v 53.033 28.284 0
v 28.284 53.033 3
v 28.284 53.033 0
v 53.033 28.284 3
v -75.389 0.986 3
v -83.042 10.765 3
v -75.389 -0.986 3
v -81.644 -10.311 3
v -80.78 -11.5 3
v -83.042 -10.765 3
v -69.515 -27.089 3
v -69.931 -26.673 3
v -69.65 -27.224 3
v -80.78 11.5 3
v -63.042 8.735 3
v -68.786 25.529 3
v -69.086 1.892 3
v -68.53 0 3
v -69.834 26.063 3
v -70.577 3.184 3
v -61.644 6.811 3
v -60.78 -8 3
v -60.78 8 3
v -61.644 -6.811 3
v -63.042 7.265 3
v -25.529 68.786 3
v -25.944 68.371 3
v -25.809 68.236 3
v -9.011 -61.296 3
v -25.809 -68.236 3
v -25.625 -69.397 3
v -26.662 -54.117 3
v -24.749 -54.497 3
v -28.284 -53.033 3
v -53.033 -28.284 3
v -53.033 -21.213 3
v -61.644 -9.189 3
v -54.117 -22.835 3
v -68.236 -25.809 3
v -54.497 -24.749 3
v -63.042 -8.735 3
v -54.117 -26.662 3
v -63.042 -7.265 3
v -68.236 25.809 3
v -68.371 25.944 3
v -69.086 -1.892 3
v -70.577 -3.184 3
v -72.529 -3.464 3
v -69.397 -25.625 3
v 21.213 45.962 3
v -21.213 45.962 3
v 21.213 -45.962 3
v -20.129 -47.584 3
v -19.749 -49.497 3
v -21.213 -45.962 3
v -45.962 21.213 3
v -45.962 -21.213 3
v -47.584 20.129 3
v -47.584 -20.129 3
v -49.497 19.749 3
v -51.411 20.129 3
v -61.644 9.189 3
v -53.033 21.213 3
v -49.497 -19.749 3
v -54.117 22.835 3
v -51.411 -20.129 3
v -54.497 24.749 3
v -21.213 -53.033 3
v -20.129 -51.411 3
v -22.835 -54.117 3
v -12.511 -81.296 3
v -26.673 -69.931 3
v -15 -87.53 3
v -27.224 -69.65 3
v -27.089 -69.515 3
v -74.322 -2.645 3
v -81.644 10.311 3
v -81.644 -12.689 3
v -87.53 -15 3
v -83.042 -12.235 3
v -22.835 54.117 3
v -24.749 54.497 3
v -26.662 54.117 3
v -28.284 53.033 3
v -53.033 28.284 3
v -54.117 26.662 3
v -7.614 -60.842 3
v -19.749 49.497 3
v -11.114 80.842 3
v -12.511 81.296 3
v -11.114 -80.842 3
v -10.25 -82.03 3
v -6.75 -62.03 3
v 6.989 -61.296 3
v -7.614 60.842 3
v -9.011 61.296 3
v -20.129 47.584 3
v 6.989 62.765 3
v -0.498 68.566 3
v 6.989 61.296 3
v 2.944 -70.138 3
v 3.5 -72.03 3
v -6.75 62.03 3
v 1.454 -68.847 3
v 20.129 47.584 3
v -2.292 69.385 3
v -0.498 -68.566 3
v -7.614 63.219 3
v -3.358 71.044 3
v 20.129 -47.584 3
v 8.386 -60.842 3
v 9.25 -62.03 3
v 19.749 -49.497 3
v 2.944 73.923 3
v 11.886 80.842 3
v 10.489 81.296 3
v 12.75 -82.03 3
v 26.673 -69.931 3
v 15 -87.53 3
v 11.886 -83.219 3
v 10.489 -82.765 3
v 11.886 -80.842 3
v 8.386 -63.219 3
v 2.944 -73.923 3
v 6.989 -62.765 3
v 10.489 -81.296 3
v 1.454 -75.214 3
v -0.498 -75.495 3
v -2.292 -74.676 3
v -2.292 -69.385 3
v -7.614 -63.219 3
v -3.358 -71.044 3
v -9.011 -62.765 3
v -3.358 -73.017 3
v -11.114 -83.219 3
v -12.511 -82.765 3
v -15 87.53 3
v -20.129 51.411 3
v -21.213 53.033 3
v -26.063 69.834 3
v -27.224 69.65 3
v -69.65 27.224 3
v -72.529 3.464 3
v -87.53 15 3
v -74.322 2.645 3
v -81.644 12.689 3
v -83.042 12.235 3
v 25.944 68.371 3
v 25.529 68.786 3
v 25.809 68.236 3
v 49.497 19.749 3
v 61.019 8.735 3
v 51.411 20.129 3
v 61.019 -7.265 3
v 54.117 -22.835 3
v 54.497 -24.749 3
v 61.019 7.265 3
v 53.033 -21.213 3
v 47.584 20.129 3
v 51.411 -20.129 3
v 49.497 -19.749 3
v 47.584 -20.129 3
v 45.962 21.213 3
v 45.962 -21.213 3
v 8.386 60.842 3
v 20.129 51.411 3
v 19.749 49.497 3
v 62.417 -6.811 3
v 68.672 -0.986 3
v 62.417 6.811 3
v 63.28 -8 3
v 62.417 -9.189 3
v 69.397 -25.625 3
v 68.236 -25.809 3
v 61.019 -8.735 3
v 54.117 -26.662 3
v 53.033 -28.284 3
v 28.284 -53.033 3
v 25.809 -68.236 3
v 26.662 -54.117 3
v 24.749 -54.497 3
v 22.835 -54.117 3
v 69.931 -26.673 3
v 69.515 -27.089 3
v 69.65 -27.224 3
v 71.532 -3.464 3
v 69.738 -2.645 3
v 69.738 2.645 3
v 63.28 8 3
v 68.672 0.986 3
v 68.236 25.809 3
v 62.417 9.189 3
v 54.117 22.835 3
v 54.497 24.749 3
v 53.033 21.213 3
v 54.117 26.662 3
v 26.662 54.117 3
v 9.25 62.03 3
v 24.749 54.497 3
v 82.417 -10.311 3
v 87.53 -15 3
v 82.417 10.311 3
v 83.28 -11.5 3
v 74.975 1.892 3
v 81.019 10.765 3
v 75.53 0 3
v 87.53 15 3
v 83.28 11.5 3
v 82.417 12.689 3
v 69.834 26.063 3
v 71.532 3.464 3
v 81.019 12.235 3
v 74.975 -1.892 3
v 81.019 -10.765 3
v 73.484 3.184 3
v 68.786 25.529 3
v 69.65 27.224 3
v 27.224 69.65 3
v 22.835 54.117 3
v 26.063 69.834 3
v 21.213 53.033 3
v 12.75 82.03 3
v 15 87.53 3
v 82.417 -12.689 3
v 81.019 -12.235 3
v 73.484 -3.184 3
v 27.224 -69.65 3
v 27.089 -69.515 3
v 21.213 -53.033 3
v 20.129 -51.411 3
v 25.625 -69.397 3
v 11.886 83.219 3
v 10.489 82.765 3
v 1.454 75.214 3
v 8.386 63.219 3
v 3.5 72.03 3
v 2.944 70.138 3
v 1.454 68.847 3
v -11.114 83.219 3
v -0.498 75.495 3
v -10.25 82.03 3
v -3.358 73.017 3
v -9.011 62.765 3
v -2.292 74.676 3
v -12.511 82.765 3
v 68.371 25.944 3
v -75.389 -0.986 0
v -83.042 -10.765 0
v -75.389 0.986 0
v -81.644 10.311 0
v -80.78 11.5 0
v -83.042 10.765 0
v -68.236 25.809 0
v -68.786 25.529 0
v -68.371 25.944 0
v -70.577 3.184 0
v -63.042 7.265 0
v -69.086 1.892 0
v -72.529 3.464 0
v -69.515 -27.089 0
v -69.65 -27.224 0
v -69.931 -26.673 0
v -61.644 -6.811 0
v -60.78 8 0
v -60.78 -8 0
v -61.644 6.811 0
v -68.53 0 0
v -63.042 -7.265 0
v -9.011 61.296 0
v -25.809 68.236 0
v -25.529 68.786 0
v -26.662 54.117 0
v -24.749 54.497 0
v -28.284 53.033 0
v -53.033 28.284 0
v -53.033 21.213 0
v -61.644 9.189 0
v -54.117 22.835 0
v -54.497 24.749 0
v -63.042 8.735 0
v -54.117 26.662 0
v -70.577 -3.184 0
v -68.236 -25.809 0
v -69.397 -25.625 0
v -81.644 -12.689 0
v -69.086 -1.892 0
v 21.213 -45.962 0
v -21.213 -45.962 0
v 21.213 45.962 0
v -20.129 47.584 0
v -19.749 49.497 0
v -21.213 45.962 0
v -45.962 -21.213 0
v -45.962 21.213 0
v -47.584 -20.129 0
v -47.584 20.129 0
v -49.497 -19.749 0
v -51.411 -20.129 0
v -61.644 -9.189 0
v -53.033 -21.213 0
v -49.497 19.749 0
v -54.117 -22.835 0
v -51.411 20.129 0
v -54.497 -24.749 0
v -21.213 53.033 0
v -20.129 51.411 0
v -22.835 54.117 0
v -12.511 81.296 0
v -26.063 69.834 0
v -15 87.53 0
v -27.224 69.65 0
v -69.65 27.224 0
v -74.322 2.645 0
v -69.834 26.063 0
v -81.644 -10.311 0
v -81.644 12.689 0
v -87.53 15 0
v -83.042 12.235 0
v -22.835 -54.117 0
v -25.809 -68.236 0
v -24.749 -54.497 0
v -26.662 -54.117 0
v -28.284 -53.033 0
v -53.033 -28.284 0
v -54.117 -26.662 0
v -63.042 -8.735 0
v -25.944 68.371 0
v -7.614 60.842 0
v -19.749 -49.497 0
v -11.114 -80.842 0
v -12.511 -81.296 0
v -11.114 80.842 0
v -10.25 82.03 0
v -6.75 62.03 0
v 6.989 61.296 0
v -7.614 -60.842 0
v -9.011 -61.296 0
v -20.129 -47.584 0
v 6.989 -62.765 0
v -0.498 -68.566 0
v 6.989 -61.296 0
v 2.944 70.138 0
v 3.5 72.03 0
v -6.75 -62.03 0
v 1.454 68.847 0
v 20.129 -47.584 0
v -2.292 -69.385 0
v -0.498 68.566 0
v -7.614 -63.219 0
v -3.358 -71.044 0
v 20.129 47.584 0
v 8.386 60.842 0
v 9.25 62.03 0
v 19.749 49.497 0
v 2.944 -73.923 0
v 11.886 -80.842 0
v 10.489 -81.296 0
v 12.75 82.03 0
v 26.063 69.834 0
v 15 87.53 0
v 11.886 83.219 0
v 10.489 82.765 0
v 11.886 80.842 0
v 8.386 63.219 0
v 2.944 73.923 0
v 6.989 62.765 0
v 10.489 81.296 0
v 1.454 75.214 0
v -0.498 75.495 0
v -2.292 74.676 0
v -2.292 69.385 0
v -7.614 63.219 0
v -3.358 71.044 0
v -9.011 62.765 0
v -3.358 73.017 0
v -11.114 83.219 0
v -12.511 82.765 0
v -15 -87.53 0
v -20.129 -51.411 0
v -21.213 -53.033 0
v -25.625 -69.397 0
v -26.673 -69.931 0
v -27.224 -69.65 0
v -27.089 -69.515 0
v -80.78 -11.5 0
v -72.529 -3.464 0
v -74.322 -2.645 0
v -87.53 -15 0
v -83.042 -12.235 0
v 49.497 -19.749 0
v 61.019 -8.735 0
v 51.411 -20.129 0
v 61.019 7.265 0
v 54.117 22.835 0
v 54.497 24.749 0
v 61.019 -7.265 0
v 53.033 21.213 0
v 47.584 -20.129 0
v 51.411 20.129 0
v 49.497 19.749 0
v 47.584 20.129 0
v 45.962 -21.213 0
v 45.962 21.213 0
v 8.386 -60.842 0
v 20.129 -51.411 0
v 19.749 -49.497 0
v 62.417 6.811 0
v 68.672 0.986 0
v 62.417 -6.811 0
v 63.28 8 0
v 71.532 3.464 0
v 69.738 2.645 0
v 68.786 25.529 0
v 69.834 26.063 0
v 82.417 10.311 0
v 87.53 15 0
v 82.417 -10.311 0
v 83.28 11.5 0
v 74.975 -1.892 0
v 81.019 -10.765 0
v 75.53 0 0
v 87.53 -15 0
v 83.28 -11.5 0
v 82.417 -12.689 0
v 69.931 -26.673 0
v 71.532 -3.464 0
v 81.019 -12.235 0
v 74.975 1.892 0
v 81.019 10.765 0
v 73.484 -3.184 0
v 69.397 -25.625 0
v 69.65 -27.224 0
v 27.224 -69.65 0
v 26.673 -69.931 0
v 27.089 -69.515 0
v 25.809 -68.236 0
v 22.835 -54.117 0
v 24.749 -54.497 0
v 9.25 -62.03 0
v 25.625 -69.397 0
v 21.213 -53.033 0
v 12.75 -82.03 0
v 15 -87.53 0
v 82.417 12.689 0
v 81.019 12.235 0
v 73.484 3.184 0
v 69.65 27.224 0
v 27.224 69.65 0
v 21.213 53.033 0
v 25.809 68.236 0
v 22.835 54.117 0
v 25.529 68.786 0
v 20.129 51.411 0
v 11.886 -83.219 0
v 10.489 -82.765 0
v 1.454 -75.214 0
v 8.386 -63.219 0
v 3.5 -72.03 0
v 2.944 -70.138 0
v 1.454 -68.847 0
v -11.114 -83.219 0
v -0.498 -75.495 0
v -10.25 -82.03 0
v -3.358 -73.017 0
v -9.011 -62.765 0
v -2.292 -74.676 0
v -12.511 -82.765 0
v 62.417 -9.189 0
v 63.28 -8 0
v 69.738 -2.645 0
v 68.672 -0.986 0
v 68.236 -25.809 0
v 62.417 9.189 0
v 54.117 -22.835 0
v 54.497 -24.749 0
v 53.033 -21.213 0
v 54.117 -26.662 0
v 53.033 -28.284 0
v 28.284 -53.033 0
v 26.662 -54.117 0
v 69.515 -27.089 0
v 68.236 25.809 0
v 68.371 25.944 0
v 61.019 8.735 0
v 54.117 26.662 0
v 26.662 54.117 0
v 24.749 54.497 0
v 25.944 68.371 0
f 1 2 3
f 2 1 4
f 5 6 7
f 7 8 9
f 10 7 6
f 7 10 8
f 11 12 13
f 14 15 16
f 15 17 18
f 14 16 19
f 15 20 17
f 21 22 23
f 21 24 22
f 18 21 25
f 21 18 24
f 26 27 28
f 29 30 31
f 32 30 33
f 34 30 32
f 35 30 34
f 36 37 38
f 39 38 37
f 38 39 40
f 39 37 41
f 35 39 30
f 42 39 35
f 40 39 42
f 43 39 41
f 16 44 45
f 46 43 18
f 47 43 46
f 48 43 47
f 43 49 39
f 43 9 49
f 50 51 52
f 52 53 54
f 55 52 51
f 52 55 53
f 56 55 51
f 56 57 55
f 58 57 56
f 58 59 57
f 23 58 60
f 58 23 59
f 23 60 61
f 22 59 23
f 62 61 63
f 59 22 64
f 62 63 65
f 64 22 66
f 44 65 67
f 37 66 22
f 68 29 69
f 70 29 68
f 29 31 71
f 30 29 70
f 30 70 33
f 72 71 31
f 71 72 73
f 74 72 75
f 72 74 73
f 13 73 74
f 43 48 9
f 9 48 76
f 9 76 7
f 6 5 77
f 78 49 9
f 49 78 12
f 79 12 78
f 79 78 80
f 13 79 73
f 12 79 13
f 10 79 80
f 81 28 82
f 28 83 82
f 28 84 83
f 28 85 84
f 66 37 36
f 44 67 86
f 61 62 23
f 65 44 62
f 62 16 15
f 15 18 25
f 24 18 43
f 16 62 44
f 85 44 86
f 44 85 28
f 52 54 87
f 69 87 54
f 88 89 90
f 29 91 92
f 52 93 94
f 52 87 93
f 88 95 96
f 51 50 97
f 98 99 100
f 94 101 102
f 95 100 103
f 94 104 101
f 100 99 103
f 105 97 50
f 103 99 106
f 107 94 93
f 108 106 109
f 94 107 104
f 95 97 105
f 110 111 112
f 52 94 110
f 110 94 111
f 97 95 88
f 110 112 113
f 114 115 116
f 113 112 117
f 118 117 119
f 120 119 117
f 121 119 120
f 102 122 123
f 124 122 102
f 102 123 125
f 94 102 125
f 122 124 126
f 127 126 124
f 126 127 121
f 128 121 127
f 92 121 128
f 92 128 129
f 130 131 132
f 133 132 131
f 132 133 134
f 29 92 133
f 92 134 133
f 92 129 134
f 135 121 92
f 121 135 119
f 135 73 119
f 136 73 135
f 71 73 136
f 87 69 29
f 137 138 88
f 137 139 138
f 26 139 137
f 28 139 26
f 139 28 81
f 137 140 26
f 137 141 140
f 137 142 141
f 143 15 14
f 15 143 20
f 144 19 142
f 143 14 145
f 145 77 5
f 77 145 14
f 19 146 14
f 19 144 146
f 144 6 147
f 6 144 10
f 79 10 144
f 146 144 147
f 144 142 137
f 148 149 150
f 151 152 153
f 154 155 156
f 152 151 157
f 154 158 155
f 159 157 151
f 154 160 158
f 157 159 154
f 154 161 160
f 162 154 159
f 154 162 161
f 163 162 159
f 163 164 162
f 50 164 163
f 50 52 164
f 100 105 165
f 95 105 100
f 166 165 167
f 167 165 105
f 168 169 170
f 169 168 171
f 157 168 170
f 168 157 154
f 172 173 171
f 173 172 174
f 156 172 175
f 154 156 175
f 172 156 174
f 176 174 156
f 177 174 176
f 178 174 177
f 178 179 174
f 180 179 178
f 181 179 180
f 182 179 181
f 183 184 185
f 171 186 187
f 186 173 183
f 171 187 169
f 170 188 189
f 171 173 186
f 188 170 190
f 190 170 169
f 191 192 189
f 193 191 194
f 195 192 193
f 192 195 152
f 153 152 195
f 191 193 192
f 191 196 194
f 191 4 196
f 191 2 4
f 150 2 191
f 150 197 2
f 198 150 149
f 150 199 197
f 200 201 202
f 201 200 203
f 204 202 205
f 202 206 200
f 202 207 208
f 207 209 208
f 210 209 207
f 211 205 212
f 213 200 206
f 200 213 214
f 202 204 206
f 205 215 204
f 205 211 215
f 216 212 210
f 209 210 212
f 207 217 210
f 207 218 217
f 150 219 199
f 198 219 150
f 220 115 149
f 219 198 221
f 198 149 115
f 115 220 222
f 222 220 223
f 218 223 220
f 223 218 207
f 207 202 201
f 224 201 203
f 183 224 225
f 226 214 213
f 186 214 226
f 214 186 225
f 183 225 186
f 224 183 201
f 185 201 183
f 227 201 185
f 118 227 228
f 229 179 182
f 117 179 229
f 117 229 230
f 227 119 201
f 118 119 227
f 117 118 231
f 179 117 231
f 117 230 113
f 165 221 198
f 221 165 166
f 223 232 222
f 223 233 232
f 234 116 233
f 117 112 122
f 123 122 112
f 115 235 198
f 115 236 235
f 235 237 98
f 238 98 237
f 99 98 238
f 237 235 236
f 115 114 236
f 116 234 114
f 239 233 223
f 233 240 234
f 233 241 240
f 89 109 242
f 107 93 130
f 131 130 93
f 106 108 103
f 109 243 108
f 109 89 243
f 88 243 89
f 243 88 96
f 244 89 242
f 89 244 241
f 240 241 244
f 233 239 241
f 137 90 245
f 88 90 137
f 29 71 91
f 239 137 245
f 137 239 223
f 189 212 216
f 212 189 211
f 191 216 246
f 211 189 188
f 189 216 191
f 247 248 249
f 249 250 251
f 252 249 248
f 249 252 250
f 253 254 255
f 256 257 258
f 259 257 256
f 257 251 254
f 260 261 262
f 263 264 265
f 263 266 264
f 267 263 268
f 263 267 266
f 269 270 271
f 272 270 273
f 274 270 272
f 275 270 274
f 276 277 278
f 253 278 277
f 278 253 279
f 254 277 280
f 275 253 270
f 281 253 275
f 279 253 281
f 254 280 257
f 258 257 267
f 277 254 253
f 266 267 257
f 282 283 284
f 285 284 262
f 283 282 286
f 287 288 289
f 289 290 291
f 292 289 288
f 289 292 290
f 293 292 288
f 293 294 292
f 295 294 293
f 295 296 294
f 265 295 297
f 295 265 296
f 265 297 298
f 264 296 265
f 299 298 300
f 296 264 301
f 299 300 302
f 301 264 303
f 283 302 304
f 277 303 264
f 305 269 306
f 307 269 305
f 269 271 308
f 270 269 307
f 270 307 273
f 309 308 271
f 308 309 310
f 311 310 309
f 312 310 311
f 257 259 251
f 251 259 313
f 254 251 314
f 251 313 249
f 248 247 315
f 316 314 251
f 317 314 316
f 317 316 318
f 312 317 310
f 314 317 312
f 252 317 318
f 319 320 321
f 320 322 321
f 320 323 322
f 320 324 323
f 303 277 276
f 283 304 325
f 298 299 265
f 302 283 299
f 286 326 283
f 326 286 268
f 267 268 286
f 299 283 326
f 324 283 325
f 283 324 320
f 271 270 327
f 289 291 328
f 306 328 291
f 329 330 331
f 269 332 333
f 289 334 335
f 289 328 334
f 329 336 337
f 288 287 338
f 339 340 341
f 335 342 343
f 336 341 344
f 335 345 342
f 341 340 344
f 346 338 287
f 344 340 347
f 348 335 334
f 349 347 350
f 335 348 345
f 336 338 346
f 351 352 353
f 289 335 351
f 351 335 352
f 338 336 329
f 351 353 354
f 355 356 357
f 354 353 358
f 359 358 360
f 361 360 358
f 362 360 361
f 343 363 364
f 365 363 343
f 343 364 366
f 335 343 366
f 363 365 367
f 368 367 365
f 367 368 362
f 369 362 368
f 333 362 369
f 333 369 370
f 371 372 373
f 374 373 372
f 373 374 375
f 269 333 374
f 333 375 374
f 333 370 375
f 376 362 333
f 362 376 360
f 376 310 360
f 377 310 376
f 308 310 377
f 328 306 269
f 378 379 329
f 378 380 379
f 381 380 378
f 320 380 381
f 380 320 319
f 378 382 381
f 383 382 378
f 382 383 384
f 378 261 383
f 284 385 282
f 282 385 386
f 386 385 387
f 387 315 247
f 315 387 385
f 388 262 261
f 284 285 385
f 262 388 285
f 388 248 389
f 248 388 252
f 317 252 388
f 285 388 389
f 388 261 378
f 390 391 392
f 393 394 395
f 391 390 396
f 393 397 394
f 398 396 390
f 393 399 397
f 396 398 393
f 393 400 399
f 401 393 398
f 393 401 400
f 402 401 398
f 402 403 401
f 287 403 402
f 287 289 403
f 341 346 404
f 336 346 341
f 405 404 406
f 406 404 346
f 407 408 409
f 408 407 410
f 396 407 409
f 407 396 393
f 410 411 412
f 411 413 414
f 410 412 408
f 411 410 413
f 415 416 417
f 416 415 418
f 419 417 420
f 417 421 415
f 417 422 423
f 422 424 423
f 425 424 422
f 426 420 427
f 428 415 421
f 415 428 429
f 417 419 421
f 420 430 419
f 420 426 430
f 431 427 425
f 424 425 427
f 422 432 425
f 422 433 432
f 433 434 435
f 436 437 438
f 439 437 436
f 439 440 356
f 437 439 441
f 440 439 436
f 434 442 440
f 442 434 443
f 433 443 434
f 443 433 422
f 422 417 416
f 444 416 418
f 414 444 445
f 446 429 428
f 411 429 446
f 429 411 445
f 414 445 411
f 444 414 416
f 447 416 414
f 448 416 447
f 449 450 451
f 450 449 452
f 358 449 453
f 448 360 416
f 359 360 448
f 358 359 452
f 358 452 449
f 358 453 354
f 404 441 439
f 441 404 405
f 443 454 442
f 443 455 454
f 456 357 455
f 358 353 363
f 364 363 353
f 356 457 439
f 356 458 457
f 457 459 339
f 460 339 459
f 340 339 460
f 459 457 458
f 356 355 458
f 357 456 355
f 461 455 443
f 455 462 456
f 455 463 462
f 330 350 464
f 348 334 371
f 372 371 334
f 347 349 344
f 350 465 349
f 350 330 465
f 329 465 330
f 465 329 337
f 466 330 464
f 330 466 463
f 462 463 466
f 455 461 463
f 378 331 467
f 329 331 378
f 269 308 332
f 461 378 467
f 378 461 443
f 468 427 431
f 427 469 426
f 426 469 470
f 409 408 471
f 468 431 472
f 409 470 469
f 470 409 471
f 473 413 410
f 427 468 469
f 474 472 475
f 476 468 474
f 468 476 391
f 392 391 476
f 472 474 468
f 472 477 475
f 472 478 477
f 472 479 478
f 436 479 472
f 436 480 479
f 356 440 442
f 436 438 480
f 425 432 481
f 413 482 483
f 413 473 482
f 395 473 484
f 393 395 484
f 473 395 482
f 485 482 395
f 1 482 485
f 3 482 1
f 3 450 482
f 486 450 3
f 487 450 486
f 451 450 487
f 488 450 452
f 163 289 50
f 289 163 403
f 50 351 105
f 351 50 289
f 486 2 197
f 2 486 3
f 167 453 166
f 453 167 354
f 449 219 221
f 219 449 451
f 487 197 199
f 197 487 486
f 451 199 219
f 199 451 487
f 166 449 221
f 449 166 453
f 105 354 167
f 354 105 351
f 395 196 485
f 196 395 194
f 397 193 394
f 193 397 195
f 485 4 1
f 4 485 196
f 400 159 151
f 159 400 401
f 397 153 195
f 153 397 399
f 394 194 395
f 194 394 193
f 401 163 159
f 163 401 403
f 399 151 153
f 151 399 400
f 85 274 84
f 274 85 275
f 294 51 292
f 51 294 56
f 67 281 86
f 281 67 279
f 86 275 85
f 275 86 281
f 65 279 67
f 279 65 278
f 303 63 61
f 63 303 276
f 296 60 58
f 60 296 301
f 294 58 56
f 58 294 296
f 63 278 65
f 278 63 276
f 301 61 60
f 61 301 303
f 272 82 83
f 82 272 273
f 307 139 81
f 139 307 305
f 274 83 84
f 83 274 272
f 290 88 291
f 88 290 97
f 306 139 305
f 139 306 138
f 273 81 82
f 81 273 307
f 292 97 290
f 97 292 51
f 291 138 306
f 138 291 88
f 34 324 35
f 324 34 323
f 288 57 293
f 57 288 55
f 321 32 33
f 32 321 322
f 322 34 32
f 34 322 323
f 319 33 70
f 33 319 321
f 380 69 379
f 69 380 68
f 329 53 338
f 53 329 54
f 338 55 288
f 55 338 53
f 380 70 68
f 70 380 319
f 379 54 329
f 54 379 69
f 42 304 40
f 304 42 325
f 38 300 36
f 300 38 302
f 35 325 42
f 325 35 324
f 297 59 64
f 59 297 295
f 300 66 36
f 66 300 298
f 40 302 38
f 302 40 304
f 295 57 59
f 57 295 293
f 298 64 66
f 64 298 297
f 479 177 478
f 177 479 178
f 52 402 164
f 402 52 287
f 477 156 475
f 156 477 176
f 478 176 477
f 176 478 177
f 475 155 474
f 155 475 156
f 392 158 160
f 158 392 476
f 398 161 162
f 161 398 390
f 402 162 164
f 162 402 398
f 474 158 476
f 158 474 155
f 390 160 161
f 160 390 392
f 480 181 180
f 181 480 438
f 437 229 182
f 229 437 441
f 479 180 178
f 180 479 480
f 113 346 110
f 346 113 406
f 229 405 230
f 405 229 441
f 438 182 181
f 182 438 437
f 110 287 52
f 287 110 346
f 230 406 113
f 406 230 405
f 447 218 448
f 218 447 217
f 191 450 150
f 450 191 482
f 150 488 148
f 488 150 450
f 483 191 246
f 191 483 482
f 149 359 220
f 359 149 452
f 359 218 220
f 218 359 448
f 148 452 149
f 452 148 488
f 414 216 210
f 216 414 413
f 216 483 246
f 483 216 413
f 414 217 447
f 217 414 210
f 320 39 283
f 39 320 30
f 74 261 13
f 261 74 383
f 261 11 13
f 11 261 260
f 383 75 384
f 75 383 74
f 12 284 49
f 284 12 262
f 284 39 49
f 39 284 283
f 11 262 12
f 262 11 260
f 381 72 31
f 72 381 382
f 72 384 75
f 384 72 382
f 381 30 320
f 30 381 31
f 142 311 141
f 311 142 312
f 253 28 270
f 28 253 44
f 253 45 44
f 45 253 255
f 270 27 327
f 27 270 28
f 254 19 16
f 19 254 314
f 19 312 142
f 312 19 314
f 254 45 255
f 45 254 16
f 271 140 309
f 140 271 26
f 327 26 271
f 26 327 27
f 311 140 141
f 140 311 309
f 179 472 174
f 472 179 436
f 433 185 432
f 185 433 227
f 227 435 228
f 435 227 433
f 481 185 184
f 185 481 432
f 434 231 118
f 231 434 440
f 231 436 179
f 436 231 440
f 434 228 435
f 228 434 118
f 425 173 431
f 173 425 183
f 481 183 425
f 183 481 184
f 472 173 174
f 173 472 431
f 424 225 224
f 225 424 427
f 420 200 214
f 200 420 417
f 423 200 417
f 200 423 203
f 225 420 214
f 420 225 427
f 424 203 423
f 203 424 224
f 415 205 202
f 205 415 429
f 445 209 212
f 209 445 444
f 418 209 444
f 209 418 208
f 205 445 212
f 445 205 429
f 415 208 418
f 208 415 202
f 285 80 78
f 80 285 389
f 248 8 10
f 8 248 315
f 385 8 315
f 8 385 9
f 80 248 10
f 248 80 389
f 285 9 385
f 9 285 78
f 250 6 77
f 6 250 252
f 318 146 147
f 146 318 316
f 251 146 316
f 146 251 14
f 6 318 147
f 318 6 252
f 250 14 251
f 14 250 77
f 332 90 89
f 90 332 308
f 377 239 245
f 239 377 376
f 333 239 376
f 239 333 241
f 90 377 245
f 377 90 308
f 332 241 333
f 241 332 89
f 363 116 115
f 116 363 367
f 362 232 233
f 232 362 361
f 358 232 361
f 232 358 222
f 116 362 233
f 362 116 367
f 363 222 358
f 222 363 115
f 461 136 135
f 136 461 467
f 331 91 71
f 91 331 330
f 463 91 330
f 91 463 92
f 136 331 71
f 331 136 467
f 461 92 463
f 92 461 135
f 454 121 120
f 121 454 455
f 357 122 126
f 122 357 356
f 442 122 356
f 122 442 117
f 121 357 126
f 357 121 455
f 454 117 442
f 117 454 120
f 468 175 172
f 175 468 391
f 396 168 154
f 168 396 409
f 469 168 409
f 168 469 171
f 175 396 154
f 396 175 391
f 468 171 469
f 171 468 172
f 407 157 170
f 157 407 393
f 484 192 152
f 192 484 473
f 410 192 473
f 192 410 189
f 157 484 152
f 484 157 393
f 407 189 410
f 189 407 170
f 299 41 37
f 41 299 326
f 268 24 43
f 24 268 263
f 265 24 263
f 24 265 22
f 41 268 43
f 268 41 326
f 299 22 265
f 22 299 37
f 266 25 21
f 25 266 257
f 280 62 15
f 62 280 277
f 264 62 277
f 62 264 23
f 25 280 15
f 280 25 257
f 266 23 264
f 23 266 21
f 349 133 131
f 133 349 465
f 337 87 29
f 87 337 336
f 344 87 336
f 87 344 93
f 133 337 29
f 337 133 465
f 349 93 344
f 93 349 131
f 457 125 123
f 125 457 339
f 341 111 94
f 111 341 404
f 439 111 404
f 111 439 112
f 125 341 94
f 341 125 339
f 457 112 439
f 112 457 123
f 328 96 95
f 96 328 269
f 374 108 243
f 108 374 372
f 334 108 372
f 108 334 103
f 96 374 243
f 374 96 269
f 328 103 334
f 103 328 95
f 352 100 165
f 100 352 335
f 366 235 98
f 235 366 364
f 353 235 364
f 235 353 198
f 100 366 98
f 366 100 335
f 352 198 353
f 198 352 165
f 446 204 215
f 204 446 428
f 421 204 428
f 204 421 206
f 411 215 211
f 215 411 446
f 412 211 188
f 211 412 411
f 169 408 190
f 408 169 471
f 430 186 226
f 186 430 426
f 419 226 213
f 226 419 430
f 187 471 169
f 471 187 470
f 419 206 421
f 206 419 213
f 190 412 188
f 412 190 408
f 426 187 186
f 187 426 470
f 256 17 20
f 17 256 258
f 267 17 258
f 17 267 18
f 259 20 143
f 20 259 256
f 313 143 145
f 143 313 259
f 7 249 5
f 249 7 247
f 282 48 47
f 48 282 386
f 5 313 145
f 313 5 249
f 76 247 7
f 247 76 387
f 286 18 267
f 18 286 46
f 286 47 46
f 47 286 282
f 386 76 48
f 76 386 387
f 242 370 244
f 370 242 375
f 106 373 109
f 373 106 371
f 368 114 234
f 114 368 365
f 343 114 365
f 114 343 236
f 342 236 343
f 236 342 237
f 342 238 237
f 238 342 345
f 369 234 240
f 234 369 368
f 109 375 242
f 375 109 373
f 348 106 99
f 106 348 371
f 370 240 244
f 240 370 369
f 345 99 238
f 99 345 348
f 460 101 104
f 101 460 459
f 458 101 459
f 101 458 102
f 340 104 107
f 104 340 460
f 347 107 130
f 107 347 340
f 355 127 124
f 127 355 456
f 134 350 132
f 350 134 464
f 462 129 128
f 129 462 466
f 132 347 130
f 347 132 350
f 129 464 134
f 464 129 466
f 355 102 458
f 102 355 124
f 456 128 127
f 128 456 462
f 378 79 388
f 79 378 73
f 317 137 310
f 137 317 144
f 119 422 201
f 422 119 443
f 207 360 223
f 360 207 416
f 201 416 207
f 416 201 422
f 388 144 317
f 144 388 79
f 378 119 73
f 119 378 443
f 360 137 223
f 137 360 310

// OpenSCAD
// file: common.scad
module M25Hole(x, y, z, depth) {
    translate([x, y, z]) {
        cylinder(h = depth, d = 2.5, center = true);
    }
}

module M6Hole(x, y, z, depth) {
    translate([x, y, z]) {
        cylinder(h = depth, d = 7.0, center = true);
    }
}

module Plate(plate_width, plate_depth) {
  difference() {
    // plate
    rotate(45) {
      translate([-plate_width / 2.0, -plate_width / 2.0, 0.0]) {
        cube([plate_width, plate_width, plate_depth]);
      }
    }

    // square cut plate corners
    A = plate_width;
    B = sqrt(2 * pow(A, 2));
    C = 30.0;
    D = 30.0;

    translate([B / 2.0, 0.0, plate_depth / 2.0]) {
      cube([C, D, plate_depth], true);
    }
    translate([-B / 2.0, 0.0, plate_depth / 2.0]) {
      cube([C, D, plate_depth], true);
    }
    translate([0.0, -B / 2.0, plate_depth / 2.0]) {
      cube([D, C, plate_depth], true);
    }
    translate([0.0, B/ 2.0, plate_depth / 2.0]) {
      cube([D, C, plate_depth], true);
    }

    // holes
    rotate(-135) {
      CableRoutingHoles(plate_width, plate_depth);
      CableFasteningHoles(plate_width, plate_depth);
    }
    ArmScrewHoles(plate_width, plate_depth, B - C);
    StackHoles(plate_width, plate_depth, B - C);
  }
}

module OdroidXU4MountHoles(plate_depth) {
    depth = 76;
    width = 52;

    rotate(45) {
        M25Hole(depth / 2.0, width / 2.0, 0.0, plate_depth * 2);
        M25Hole(-depth / 2.0, width / 2.0, 0.0, plate_depth * 2);
        M25Hole(depth / 2.0, -width / 2.0, 0.0, plate_depth * 2);
        M25Hole(-depth / 2.0, -width / 2.0, 0.0, plate_depth * 2);
    }
}

module StackHoles(plate_width, plate_depth, plate_diagonal) {
    between_line = 20.0;

    E = 5.5;
    F = (plate_diagonal / 2.0) - E;
    H = F - (between_line / 2.0);

    M6Hole(H, 0.0, plate_depth / 2.0, plate_depth);
    M6Hole(-H, 0.0, plate_depth / 2.0, plate_depth);
    M6Hole(0.0, H, plate_depth / 2.0, plate_depth);
    M6Hole(0.0, -H, plate_depth / 2.0, plate_depth);
}

module CableFasteningHoles(plate_width, plate_depth) {
  inner_width = plate_width - 10.0;
  hole_width = 60;
  hole_length = 2;

  translate([inner_width / 2.0, 0.0, plate_depth / 2.0]) {
    cube(size=[hole_length, hole_width, plate_depth], center=true);
    translate([0.0, hole_width / 2.0, -plate_depth / 2.0]) {
      cylinder(r=hole_length / 2.0, h=plate_depth, center=false);
    }
    translate([0.0, -hole_width / 2.0, -plate_depth / 2.0]) {
      cylinder(r=hole_length / 2.0, h=plate_depth, center=false);
    }
  }

  translate([-inner_width / 2.0, 0.0, plate_depth / 2.0]) {
    cube(size=[hole_length, hole_width, plate_depth], center=true);
    translate([0.0, hole_width / 2.0, -plate_depth / 2.0]) {
      cylinder(r=hole_length / 2.0, h=plate_depth, center=false);
    }
    translate([0.0, -hole_width / 2.0, -plate_depth / 2.0]) {
      cylinder(r=hole_length / 2.0, h=plate_depth, center=false);
    }
  }

  rotate(90) translate([inner_width / 2.0, 0.0, plate_depth / 2.0]) {
    cube(size=[hole_length, hole_width, plate_depth], center=true);
    translate([0.0, hole_width / 2.0, -plate_depth / 2.0]) {
      cylinder(r=hole_length / 2.0, h=plate_depth, center=false);
    }
    translate([0.0, -hole_width / 2.0, -plate_depth / 2.0]) {
      cylinder(r=hole_length / 2.0, h=plate_depth, center=false);
    }
  }

  rotate(90) translate([-inner_width / 2.0, 0.0, plate_depth / 2.0]) {
    cube(size=[hole_length, hole_width, plate_depth], center=true);
    translate([0.0, hole_width / 2.0, -plate_depth / 2.0]) {
      cylinder(r=hole_length / 2.0, h=plate_depth, center=false);
    }
    translate([0.0, -hole_width / 2.0, -plate_depth / 2.0]) {
      cylinder(r=hole_length / 2.0, h=plate_depth, center=false);
    }
  }
}

module CableRoutingHoles(plate_width, plate_depth) {
  routing_width = plate_width - 40.0;
  hole_width = 35;
  hole_length = 10;

  // inner cable fastening holes
  translate([routing_width / 2.0, 0.0, plate_depth / 2.0]) {
    cube(size=[hole_length, hole_width, plate_depth], center=true);
    translate([0.0, hole_width / 2.0, -plate_depth / 2.0]) {
      cylinder(r=hole_length / 2.0, h=plate_depth, center=false);
    }
    translate([0.0, -hole_width / 2.0, -plate_depth / 2.0]) {
      cylinder(r=hole_length / 2.0, h=plate_depth, center=false);
    }
  }

  rotate(90) translate([routing_width / 2.0, 0.0, plate_depth / 2.0]) {
    cube(size=[hole_length, hole_width, plate_depth], center=true);
    translate([0.0, hole_width / 2.0, -plate_depth / 2.0]) {
      cylinder(r=hole_length / 2.0, h=plate_depth, center=false);
    }
    translate([0.0, -hole_width / 2.0, -plate_depth / 2.0]) {
      cylinder(r=hole_length / 2.0, h=plate_depth, center=false);
    }
  }

  rotate(180) translate([routing_width / 2.0, 0.0, plate_depth / 2.0]) {
    cube(size=[hole_length, hole_width, plate_depth], center=true);
    translate([0.0, hole_width / 2.0, -plate_depth / 2.0]) {
      cylinder(r=hole_length / 2.0, h=plate_depth, center=false);
    }
    translate([0.0, -hole_width / 2.0, -plate_depth / 2.0]) {
      cylinder(r=hole_length / 2.0, h=plate_depth, center=false);
    }
  }

  rotate(270) translate([routing_width / 2.0, 0.0, plate_depth / 2.0]) {
    cube(size=[hole_length, hole_width, plate_depth], center=true);
    translate([0.0, hole_width / 2.0, -plate_depth / 2.0]) {
      cylinder(r=hole_length / 2.0, h=plate_depth, center=false);
    }
    translate([0.0, -hole_width / 2.0, -plate_depth / 2.0]) {
      cylinder(r=hole_length / 2.0, h=plate_depth, center=false);
    }
  }
}

module BatteryStrapHoles(plate_width, plate_depth) {
  hole_width = 5;
  hole_length = 25;
  hole_between_width = 45;

  rotate(45) {
    translate([hole_between_width / 2.0, 0.0, plate_depth / 2.0]) {
      cube([hole_width, hole_length, plate_depth], center = true);
      translate([0.0, hole_length / 2.0, -plate_depth / 2.0]) {
        cylinder(r=hole_width / 2.0, h=plate_depth, center=false);
      }
      translate([0.0, -hole_length / 2.0, -plate_depth / 2.0]) {
        cylinder(r=hole_width / 2.0, h=plate_depth, center=false);
      }
    }
  }

  rotate(45) {
    translate([-hole_between_width / 2.0, 0.0, plate_depth / 2.0]) {
      cube([hole_width, hole_length, plate_depth], center = true);
      translate([0.0, hole_length / 2.0, -plate_depth / 2.0]) {
        cylinder(r=hole_width / 2.0, h=plate_depth, center=false);
      }
      translate([0.0, -hole_length / 2.0, -plate_depth / 2.0]) {
        cylinder(r=hole_width / 2.0, h=plate_depth, center=false);
      }
    }
  }
}

module LowerArmScrewHoles(plate_width, plate_depth, plate_diagonal) {
  base_line = 21.0;
  between_line = 20.0;

  E = 5.5;
  F = (plate_diagonal / 2.0) - E;
  G = F - between_line;

  // outer screw holes
  M25Hole(F, -base_line / 2.0, plate_depth / 2.0, plate_depth);
  M25Hole(F, base_line / 2.0, plate_depth / 2.0, plate_depth);

  M25Hole(-F, -base_line / 2.0, plate_depth / 2.0, plate_depth);
  M25Hole(-F, base_line / 2.0, plate_depth / 2.0, plate_depth);

  M25Hole(-base_line / 2.0, F, plate_depth / 2.0, plate_depth);
  M25Hole(base_line / 2.0, F, plate_depth / 2.0, plate_depth);

  M25Hole(-base_line / 2.0, -F, plate_depth / 2.0, plate_depth);
  M25Hole(base_line / 2.0, -F, plate_depth / 2.0, plate_depth);
}
// main file
include <common.scad>;

// plate parameters
plate_width = 145.0;
plate_depth = 3.0;

module ESCMountHoles(plate_depth) {
  esc_width = 56;
  esc_length = 65;
  hole_width = 30;
  hole_length = 3;

  translate([esc_width / 2.0, 0.0, plate_depth / 2.0]) {
    cube(size=[hole_length, hole_width, plate_depth], center=true);
    translate([0.0, hole_width / 2.0, -plate_depth / 2.0]) {
      cylinder(r=hole_length / 2.0, h=plate_depth, center=false);
    }
    translate([0.0, -hole_width / 2.0, -plate_depth / 2.0]) {
      cylinder(r=hole_length / 2.0, h=plate_depth, center=false);
    }
  }

  translate([-esc_width / 2.0, 0.0, plate_depth / 2.0]) {
    cube(size=[hole_length, hole_width, plate_depth], center=true);
    translate([0.0, hole_width / 2.0, -plate_depth / 2.0]) {
      cylinder(r=hole_length / 2.0, h=plate_depth, center=false);
    }
    translate([0.0, -hole_width / 2.0, -plate_depth / 2.0]) {
      cylinder(r=hole_length / 2.0, h=plate_depth, center=false);
    }
  }

  translate([0.0, esc_length / 2.0, plate_depth / 2.0]) {
    cube(size=[hole_width, hole_length, plate_depth], center=true);
    translate([hole_width / 2.0, 0.0, -plate_depth / 2.0]) {
      cylinder(r=hole_length / 2.0, h=plate_depth, center=false);
    }
    translate([-hole_width / 2.0, 0.0, -plate_depth / 2.0]) {
      cylinder(r=hole_length / 2.0, h=plate_depth, center=false);
    }
  }

  translate([0.0, -esc_length / 2.0, plate_depth / 2.0]) {
    cube(size=[hole_width, hole_length, plate_depth], center=true);
    translate([hole_width / 2.0, 0.0, -plate_depth / 2.0]) {
      cylinder(r=hole_length / 2.0, h=plate_depth, center=false);
    }
    translate([-hole_width / 2.0, 0.0, -plate_depth / 2.0]) {
      cylinder(r=hole_length / 2.0, h=plate_depth, center=false);
    }
  }
}

module ArmScrewHoles(plate_width, plate_depth, plate_diagonal) {
  base_line = 23.0;
  top_line = 16.0;
  between_line = 20.0;

  E = 5.5;
  F = (plate_diagonal / 2.0) - E;
  G = F - between_line;

  // outer screw holes
  M25Hole(F, -base_line / 2.0, plate_depth / 2.0, plate_depth);
  M25Hole(F, base_line / 2.0, plate_depth / 2.0, plate_depth);

  M25Hole(-F, -base_line / 2.0, plate_depth / 2.0, plate_depth);
  M25Hole(-F, base_line / 2.0, plate_depth / 2.0, plate_depth);

  M25Hole(-base_line / 2.0, F, plate_depth / 2.0, plate_depth);
  M25Hole(base_line / 2.0, F, plate_depth / 2.0, plate_depth);

  M25Hole(-base_line / 2.0, -F, plate_depth / 2.0, plate_depth);
  M25Hole(base_line / 2.0, -F, plate_depth / 2.0, plate_depth);

  // inner screw holes
  M25Hole(G, -top_line / 2, plate_depth / 2.0, plate_depth);
  M25Hole(G, top_line / 2, plate_depth / 2.0, plate_depth);

  M25Hole(-G, -top_line / 2, plate_depth / 2.0, plate_depth);
  M25Hole(-G, top_line / 2, plate_depth / 2.0, plate_depth);

  M25Hole(-top_line / 2, -G, plate_depth / 2.0, plate_depth);
  M25Hole(top_line / 2, -G, plate_depth / 2.0, plate_depth);

  M25Hole(-top_line / 2, G, plate_depth / 2.0, plate_depth);
  M25Hole(top_line / 2, G, plate_depth / 2.0, plate_depth);
}

module TopPlate(plate_width, plate_depth) {
  difference() {
    // plate
    rotate(45) {
      translate([-plate_width / 2.0, -plate_width / 2.0, 0.0]) {
        cube([plate_width, plate_width, plate_depth]);
      }
    }

    // square cut plate corners
    A = plate_width;
    B = sqrt(2 * pow(A, 2));
    C = 30.0;
    D = 30.0;

    translate([B / 2.0, 0.0, plate_depth / 2.0]) cube([C, D, plate_depth], true);
    translate([-B / 2.0, 0.0, plate_depth / 2.0]) cube([C, D, plate_depth], true);
    translate([0.0, -B / 2.0, plate_depth / 2.0]) cube([D, C, plate_depth], true);
    translate([0.0, B/ 2.0, plate_depth / 2.0]) cube([D, C, plate_depth], true);

    // holes
    rotate(45) {
      CableRoutingHoles(plate_width, plate_depth);
      CableFasteningHoles(plate_width, plate_depth);
    }
    ArmScrewHoles(plate_width, plate_depth, B - C);
    StackHoles(plate_width, plate_depth, B - C);
  }
}

TopPlate(plate_width, plate_depth);
